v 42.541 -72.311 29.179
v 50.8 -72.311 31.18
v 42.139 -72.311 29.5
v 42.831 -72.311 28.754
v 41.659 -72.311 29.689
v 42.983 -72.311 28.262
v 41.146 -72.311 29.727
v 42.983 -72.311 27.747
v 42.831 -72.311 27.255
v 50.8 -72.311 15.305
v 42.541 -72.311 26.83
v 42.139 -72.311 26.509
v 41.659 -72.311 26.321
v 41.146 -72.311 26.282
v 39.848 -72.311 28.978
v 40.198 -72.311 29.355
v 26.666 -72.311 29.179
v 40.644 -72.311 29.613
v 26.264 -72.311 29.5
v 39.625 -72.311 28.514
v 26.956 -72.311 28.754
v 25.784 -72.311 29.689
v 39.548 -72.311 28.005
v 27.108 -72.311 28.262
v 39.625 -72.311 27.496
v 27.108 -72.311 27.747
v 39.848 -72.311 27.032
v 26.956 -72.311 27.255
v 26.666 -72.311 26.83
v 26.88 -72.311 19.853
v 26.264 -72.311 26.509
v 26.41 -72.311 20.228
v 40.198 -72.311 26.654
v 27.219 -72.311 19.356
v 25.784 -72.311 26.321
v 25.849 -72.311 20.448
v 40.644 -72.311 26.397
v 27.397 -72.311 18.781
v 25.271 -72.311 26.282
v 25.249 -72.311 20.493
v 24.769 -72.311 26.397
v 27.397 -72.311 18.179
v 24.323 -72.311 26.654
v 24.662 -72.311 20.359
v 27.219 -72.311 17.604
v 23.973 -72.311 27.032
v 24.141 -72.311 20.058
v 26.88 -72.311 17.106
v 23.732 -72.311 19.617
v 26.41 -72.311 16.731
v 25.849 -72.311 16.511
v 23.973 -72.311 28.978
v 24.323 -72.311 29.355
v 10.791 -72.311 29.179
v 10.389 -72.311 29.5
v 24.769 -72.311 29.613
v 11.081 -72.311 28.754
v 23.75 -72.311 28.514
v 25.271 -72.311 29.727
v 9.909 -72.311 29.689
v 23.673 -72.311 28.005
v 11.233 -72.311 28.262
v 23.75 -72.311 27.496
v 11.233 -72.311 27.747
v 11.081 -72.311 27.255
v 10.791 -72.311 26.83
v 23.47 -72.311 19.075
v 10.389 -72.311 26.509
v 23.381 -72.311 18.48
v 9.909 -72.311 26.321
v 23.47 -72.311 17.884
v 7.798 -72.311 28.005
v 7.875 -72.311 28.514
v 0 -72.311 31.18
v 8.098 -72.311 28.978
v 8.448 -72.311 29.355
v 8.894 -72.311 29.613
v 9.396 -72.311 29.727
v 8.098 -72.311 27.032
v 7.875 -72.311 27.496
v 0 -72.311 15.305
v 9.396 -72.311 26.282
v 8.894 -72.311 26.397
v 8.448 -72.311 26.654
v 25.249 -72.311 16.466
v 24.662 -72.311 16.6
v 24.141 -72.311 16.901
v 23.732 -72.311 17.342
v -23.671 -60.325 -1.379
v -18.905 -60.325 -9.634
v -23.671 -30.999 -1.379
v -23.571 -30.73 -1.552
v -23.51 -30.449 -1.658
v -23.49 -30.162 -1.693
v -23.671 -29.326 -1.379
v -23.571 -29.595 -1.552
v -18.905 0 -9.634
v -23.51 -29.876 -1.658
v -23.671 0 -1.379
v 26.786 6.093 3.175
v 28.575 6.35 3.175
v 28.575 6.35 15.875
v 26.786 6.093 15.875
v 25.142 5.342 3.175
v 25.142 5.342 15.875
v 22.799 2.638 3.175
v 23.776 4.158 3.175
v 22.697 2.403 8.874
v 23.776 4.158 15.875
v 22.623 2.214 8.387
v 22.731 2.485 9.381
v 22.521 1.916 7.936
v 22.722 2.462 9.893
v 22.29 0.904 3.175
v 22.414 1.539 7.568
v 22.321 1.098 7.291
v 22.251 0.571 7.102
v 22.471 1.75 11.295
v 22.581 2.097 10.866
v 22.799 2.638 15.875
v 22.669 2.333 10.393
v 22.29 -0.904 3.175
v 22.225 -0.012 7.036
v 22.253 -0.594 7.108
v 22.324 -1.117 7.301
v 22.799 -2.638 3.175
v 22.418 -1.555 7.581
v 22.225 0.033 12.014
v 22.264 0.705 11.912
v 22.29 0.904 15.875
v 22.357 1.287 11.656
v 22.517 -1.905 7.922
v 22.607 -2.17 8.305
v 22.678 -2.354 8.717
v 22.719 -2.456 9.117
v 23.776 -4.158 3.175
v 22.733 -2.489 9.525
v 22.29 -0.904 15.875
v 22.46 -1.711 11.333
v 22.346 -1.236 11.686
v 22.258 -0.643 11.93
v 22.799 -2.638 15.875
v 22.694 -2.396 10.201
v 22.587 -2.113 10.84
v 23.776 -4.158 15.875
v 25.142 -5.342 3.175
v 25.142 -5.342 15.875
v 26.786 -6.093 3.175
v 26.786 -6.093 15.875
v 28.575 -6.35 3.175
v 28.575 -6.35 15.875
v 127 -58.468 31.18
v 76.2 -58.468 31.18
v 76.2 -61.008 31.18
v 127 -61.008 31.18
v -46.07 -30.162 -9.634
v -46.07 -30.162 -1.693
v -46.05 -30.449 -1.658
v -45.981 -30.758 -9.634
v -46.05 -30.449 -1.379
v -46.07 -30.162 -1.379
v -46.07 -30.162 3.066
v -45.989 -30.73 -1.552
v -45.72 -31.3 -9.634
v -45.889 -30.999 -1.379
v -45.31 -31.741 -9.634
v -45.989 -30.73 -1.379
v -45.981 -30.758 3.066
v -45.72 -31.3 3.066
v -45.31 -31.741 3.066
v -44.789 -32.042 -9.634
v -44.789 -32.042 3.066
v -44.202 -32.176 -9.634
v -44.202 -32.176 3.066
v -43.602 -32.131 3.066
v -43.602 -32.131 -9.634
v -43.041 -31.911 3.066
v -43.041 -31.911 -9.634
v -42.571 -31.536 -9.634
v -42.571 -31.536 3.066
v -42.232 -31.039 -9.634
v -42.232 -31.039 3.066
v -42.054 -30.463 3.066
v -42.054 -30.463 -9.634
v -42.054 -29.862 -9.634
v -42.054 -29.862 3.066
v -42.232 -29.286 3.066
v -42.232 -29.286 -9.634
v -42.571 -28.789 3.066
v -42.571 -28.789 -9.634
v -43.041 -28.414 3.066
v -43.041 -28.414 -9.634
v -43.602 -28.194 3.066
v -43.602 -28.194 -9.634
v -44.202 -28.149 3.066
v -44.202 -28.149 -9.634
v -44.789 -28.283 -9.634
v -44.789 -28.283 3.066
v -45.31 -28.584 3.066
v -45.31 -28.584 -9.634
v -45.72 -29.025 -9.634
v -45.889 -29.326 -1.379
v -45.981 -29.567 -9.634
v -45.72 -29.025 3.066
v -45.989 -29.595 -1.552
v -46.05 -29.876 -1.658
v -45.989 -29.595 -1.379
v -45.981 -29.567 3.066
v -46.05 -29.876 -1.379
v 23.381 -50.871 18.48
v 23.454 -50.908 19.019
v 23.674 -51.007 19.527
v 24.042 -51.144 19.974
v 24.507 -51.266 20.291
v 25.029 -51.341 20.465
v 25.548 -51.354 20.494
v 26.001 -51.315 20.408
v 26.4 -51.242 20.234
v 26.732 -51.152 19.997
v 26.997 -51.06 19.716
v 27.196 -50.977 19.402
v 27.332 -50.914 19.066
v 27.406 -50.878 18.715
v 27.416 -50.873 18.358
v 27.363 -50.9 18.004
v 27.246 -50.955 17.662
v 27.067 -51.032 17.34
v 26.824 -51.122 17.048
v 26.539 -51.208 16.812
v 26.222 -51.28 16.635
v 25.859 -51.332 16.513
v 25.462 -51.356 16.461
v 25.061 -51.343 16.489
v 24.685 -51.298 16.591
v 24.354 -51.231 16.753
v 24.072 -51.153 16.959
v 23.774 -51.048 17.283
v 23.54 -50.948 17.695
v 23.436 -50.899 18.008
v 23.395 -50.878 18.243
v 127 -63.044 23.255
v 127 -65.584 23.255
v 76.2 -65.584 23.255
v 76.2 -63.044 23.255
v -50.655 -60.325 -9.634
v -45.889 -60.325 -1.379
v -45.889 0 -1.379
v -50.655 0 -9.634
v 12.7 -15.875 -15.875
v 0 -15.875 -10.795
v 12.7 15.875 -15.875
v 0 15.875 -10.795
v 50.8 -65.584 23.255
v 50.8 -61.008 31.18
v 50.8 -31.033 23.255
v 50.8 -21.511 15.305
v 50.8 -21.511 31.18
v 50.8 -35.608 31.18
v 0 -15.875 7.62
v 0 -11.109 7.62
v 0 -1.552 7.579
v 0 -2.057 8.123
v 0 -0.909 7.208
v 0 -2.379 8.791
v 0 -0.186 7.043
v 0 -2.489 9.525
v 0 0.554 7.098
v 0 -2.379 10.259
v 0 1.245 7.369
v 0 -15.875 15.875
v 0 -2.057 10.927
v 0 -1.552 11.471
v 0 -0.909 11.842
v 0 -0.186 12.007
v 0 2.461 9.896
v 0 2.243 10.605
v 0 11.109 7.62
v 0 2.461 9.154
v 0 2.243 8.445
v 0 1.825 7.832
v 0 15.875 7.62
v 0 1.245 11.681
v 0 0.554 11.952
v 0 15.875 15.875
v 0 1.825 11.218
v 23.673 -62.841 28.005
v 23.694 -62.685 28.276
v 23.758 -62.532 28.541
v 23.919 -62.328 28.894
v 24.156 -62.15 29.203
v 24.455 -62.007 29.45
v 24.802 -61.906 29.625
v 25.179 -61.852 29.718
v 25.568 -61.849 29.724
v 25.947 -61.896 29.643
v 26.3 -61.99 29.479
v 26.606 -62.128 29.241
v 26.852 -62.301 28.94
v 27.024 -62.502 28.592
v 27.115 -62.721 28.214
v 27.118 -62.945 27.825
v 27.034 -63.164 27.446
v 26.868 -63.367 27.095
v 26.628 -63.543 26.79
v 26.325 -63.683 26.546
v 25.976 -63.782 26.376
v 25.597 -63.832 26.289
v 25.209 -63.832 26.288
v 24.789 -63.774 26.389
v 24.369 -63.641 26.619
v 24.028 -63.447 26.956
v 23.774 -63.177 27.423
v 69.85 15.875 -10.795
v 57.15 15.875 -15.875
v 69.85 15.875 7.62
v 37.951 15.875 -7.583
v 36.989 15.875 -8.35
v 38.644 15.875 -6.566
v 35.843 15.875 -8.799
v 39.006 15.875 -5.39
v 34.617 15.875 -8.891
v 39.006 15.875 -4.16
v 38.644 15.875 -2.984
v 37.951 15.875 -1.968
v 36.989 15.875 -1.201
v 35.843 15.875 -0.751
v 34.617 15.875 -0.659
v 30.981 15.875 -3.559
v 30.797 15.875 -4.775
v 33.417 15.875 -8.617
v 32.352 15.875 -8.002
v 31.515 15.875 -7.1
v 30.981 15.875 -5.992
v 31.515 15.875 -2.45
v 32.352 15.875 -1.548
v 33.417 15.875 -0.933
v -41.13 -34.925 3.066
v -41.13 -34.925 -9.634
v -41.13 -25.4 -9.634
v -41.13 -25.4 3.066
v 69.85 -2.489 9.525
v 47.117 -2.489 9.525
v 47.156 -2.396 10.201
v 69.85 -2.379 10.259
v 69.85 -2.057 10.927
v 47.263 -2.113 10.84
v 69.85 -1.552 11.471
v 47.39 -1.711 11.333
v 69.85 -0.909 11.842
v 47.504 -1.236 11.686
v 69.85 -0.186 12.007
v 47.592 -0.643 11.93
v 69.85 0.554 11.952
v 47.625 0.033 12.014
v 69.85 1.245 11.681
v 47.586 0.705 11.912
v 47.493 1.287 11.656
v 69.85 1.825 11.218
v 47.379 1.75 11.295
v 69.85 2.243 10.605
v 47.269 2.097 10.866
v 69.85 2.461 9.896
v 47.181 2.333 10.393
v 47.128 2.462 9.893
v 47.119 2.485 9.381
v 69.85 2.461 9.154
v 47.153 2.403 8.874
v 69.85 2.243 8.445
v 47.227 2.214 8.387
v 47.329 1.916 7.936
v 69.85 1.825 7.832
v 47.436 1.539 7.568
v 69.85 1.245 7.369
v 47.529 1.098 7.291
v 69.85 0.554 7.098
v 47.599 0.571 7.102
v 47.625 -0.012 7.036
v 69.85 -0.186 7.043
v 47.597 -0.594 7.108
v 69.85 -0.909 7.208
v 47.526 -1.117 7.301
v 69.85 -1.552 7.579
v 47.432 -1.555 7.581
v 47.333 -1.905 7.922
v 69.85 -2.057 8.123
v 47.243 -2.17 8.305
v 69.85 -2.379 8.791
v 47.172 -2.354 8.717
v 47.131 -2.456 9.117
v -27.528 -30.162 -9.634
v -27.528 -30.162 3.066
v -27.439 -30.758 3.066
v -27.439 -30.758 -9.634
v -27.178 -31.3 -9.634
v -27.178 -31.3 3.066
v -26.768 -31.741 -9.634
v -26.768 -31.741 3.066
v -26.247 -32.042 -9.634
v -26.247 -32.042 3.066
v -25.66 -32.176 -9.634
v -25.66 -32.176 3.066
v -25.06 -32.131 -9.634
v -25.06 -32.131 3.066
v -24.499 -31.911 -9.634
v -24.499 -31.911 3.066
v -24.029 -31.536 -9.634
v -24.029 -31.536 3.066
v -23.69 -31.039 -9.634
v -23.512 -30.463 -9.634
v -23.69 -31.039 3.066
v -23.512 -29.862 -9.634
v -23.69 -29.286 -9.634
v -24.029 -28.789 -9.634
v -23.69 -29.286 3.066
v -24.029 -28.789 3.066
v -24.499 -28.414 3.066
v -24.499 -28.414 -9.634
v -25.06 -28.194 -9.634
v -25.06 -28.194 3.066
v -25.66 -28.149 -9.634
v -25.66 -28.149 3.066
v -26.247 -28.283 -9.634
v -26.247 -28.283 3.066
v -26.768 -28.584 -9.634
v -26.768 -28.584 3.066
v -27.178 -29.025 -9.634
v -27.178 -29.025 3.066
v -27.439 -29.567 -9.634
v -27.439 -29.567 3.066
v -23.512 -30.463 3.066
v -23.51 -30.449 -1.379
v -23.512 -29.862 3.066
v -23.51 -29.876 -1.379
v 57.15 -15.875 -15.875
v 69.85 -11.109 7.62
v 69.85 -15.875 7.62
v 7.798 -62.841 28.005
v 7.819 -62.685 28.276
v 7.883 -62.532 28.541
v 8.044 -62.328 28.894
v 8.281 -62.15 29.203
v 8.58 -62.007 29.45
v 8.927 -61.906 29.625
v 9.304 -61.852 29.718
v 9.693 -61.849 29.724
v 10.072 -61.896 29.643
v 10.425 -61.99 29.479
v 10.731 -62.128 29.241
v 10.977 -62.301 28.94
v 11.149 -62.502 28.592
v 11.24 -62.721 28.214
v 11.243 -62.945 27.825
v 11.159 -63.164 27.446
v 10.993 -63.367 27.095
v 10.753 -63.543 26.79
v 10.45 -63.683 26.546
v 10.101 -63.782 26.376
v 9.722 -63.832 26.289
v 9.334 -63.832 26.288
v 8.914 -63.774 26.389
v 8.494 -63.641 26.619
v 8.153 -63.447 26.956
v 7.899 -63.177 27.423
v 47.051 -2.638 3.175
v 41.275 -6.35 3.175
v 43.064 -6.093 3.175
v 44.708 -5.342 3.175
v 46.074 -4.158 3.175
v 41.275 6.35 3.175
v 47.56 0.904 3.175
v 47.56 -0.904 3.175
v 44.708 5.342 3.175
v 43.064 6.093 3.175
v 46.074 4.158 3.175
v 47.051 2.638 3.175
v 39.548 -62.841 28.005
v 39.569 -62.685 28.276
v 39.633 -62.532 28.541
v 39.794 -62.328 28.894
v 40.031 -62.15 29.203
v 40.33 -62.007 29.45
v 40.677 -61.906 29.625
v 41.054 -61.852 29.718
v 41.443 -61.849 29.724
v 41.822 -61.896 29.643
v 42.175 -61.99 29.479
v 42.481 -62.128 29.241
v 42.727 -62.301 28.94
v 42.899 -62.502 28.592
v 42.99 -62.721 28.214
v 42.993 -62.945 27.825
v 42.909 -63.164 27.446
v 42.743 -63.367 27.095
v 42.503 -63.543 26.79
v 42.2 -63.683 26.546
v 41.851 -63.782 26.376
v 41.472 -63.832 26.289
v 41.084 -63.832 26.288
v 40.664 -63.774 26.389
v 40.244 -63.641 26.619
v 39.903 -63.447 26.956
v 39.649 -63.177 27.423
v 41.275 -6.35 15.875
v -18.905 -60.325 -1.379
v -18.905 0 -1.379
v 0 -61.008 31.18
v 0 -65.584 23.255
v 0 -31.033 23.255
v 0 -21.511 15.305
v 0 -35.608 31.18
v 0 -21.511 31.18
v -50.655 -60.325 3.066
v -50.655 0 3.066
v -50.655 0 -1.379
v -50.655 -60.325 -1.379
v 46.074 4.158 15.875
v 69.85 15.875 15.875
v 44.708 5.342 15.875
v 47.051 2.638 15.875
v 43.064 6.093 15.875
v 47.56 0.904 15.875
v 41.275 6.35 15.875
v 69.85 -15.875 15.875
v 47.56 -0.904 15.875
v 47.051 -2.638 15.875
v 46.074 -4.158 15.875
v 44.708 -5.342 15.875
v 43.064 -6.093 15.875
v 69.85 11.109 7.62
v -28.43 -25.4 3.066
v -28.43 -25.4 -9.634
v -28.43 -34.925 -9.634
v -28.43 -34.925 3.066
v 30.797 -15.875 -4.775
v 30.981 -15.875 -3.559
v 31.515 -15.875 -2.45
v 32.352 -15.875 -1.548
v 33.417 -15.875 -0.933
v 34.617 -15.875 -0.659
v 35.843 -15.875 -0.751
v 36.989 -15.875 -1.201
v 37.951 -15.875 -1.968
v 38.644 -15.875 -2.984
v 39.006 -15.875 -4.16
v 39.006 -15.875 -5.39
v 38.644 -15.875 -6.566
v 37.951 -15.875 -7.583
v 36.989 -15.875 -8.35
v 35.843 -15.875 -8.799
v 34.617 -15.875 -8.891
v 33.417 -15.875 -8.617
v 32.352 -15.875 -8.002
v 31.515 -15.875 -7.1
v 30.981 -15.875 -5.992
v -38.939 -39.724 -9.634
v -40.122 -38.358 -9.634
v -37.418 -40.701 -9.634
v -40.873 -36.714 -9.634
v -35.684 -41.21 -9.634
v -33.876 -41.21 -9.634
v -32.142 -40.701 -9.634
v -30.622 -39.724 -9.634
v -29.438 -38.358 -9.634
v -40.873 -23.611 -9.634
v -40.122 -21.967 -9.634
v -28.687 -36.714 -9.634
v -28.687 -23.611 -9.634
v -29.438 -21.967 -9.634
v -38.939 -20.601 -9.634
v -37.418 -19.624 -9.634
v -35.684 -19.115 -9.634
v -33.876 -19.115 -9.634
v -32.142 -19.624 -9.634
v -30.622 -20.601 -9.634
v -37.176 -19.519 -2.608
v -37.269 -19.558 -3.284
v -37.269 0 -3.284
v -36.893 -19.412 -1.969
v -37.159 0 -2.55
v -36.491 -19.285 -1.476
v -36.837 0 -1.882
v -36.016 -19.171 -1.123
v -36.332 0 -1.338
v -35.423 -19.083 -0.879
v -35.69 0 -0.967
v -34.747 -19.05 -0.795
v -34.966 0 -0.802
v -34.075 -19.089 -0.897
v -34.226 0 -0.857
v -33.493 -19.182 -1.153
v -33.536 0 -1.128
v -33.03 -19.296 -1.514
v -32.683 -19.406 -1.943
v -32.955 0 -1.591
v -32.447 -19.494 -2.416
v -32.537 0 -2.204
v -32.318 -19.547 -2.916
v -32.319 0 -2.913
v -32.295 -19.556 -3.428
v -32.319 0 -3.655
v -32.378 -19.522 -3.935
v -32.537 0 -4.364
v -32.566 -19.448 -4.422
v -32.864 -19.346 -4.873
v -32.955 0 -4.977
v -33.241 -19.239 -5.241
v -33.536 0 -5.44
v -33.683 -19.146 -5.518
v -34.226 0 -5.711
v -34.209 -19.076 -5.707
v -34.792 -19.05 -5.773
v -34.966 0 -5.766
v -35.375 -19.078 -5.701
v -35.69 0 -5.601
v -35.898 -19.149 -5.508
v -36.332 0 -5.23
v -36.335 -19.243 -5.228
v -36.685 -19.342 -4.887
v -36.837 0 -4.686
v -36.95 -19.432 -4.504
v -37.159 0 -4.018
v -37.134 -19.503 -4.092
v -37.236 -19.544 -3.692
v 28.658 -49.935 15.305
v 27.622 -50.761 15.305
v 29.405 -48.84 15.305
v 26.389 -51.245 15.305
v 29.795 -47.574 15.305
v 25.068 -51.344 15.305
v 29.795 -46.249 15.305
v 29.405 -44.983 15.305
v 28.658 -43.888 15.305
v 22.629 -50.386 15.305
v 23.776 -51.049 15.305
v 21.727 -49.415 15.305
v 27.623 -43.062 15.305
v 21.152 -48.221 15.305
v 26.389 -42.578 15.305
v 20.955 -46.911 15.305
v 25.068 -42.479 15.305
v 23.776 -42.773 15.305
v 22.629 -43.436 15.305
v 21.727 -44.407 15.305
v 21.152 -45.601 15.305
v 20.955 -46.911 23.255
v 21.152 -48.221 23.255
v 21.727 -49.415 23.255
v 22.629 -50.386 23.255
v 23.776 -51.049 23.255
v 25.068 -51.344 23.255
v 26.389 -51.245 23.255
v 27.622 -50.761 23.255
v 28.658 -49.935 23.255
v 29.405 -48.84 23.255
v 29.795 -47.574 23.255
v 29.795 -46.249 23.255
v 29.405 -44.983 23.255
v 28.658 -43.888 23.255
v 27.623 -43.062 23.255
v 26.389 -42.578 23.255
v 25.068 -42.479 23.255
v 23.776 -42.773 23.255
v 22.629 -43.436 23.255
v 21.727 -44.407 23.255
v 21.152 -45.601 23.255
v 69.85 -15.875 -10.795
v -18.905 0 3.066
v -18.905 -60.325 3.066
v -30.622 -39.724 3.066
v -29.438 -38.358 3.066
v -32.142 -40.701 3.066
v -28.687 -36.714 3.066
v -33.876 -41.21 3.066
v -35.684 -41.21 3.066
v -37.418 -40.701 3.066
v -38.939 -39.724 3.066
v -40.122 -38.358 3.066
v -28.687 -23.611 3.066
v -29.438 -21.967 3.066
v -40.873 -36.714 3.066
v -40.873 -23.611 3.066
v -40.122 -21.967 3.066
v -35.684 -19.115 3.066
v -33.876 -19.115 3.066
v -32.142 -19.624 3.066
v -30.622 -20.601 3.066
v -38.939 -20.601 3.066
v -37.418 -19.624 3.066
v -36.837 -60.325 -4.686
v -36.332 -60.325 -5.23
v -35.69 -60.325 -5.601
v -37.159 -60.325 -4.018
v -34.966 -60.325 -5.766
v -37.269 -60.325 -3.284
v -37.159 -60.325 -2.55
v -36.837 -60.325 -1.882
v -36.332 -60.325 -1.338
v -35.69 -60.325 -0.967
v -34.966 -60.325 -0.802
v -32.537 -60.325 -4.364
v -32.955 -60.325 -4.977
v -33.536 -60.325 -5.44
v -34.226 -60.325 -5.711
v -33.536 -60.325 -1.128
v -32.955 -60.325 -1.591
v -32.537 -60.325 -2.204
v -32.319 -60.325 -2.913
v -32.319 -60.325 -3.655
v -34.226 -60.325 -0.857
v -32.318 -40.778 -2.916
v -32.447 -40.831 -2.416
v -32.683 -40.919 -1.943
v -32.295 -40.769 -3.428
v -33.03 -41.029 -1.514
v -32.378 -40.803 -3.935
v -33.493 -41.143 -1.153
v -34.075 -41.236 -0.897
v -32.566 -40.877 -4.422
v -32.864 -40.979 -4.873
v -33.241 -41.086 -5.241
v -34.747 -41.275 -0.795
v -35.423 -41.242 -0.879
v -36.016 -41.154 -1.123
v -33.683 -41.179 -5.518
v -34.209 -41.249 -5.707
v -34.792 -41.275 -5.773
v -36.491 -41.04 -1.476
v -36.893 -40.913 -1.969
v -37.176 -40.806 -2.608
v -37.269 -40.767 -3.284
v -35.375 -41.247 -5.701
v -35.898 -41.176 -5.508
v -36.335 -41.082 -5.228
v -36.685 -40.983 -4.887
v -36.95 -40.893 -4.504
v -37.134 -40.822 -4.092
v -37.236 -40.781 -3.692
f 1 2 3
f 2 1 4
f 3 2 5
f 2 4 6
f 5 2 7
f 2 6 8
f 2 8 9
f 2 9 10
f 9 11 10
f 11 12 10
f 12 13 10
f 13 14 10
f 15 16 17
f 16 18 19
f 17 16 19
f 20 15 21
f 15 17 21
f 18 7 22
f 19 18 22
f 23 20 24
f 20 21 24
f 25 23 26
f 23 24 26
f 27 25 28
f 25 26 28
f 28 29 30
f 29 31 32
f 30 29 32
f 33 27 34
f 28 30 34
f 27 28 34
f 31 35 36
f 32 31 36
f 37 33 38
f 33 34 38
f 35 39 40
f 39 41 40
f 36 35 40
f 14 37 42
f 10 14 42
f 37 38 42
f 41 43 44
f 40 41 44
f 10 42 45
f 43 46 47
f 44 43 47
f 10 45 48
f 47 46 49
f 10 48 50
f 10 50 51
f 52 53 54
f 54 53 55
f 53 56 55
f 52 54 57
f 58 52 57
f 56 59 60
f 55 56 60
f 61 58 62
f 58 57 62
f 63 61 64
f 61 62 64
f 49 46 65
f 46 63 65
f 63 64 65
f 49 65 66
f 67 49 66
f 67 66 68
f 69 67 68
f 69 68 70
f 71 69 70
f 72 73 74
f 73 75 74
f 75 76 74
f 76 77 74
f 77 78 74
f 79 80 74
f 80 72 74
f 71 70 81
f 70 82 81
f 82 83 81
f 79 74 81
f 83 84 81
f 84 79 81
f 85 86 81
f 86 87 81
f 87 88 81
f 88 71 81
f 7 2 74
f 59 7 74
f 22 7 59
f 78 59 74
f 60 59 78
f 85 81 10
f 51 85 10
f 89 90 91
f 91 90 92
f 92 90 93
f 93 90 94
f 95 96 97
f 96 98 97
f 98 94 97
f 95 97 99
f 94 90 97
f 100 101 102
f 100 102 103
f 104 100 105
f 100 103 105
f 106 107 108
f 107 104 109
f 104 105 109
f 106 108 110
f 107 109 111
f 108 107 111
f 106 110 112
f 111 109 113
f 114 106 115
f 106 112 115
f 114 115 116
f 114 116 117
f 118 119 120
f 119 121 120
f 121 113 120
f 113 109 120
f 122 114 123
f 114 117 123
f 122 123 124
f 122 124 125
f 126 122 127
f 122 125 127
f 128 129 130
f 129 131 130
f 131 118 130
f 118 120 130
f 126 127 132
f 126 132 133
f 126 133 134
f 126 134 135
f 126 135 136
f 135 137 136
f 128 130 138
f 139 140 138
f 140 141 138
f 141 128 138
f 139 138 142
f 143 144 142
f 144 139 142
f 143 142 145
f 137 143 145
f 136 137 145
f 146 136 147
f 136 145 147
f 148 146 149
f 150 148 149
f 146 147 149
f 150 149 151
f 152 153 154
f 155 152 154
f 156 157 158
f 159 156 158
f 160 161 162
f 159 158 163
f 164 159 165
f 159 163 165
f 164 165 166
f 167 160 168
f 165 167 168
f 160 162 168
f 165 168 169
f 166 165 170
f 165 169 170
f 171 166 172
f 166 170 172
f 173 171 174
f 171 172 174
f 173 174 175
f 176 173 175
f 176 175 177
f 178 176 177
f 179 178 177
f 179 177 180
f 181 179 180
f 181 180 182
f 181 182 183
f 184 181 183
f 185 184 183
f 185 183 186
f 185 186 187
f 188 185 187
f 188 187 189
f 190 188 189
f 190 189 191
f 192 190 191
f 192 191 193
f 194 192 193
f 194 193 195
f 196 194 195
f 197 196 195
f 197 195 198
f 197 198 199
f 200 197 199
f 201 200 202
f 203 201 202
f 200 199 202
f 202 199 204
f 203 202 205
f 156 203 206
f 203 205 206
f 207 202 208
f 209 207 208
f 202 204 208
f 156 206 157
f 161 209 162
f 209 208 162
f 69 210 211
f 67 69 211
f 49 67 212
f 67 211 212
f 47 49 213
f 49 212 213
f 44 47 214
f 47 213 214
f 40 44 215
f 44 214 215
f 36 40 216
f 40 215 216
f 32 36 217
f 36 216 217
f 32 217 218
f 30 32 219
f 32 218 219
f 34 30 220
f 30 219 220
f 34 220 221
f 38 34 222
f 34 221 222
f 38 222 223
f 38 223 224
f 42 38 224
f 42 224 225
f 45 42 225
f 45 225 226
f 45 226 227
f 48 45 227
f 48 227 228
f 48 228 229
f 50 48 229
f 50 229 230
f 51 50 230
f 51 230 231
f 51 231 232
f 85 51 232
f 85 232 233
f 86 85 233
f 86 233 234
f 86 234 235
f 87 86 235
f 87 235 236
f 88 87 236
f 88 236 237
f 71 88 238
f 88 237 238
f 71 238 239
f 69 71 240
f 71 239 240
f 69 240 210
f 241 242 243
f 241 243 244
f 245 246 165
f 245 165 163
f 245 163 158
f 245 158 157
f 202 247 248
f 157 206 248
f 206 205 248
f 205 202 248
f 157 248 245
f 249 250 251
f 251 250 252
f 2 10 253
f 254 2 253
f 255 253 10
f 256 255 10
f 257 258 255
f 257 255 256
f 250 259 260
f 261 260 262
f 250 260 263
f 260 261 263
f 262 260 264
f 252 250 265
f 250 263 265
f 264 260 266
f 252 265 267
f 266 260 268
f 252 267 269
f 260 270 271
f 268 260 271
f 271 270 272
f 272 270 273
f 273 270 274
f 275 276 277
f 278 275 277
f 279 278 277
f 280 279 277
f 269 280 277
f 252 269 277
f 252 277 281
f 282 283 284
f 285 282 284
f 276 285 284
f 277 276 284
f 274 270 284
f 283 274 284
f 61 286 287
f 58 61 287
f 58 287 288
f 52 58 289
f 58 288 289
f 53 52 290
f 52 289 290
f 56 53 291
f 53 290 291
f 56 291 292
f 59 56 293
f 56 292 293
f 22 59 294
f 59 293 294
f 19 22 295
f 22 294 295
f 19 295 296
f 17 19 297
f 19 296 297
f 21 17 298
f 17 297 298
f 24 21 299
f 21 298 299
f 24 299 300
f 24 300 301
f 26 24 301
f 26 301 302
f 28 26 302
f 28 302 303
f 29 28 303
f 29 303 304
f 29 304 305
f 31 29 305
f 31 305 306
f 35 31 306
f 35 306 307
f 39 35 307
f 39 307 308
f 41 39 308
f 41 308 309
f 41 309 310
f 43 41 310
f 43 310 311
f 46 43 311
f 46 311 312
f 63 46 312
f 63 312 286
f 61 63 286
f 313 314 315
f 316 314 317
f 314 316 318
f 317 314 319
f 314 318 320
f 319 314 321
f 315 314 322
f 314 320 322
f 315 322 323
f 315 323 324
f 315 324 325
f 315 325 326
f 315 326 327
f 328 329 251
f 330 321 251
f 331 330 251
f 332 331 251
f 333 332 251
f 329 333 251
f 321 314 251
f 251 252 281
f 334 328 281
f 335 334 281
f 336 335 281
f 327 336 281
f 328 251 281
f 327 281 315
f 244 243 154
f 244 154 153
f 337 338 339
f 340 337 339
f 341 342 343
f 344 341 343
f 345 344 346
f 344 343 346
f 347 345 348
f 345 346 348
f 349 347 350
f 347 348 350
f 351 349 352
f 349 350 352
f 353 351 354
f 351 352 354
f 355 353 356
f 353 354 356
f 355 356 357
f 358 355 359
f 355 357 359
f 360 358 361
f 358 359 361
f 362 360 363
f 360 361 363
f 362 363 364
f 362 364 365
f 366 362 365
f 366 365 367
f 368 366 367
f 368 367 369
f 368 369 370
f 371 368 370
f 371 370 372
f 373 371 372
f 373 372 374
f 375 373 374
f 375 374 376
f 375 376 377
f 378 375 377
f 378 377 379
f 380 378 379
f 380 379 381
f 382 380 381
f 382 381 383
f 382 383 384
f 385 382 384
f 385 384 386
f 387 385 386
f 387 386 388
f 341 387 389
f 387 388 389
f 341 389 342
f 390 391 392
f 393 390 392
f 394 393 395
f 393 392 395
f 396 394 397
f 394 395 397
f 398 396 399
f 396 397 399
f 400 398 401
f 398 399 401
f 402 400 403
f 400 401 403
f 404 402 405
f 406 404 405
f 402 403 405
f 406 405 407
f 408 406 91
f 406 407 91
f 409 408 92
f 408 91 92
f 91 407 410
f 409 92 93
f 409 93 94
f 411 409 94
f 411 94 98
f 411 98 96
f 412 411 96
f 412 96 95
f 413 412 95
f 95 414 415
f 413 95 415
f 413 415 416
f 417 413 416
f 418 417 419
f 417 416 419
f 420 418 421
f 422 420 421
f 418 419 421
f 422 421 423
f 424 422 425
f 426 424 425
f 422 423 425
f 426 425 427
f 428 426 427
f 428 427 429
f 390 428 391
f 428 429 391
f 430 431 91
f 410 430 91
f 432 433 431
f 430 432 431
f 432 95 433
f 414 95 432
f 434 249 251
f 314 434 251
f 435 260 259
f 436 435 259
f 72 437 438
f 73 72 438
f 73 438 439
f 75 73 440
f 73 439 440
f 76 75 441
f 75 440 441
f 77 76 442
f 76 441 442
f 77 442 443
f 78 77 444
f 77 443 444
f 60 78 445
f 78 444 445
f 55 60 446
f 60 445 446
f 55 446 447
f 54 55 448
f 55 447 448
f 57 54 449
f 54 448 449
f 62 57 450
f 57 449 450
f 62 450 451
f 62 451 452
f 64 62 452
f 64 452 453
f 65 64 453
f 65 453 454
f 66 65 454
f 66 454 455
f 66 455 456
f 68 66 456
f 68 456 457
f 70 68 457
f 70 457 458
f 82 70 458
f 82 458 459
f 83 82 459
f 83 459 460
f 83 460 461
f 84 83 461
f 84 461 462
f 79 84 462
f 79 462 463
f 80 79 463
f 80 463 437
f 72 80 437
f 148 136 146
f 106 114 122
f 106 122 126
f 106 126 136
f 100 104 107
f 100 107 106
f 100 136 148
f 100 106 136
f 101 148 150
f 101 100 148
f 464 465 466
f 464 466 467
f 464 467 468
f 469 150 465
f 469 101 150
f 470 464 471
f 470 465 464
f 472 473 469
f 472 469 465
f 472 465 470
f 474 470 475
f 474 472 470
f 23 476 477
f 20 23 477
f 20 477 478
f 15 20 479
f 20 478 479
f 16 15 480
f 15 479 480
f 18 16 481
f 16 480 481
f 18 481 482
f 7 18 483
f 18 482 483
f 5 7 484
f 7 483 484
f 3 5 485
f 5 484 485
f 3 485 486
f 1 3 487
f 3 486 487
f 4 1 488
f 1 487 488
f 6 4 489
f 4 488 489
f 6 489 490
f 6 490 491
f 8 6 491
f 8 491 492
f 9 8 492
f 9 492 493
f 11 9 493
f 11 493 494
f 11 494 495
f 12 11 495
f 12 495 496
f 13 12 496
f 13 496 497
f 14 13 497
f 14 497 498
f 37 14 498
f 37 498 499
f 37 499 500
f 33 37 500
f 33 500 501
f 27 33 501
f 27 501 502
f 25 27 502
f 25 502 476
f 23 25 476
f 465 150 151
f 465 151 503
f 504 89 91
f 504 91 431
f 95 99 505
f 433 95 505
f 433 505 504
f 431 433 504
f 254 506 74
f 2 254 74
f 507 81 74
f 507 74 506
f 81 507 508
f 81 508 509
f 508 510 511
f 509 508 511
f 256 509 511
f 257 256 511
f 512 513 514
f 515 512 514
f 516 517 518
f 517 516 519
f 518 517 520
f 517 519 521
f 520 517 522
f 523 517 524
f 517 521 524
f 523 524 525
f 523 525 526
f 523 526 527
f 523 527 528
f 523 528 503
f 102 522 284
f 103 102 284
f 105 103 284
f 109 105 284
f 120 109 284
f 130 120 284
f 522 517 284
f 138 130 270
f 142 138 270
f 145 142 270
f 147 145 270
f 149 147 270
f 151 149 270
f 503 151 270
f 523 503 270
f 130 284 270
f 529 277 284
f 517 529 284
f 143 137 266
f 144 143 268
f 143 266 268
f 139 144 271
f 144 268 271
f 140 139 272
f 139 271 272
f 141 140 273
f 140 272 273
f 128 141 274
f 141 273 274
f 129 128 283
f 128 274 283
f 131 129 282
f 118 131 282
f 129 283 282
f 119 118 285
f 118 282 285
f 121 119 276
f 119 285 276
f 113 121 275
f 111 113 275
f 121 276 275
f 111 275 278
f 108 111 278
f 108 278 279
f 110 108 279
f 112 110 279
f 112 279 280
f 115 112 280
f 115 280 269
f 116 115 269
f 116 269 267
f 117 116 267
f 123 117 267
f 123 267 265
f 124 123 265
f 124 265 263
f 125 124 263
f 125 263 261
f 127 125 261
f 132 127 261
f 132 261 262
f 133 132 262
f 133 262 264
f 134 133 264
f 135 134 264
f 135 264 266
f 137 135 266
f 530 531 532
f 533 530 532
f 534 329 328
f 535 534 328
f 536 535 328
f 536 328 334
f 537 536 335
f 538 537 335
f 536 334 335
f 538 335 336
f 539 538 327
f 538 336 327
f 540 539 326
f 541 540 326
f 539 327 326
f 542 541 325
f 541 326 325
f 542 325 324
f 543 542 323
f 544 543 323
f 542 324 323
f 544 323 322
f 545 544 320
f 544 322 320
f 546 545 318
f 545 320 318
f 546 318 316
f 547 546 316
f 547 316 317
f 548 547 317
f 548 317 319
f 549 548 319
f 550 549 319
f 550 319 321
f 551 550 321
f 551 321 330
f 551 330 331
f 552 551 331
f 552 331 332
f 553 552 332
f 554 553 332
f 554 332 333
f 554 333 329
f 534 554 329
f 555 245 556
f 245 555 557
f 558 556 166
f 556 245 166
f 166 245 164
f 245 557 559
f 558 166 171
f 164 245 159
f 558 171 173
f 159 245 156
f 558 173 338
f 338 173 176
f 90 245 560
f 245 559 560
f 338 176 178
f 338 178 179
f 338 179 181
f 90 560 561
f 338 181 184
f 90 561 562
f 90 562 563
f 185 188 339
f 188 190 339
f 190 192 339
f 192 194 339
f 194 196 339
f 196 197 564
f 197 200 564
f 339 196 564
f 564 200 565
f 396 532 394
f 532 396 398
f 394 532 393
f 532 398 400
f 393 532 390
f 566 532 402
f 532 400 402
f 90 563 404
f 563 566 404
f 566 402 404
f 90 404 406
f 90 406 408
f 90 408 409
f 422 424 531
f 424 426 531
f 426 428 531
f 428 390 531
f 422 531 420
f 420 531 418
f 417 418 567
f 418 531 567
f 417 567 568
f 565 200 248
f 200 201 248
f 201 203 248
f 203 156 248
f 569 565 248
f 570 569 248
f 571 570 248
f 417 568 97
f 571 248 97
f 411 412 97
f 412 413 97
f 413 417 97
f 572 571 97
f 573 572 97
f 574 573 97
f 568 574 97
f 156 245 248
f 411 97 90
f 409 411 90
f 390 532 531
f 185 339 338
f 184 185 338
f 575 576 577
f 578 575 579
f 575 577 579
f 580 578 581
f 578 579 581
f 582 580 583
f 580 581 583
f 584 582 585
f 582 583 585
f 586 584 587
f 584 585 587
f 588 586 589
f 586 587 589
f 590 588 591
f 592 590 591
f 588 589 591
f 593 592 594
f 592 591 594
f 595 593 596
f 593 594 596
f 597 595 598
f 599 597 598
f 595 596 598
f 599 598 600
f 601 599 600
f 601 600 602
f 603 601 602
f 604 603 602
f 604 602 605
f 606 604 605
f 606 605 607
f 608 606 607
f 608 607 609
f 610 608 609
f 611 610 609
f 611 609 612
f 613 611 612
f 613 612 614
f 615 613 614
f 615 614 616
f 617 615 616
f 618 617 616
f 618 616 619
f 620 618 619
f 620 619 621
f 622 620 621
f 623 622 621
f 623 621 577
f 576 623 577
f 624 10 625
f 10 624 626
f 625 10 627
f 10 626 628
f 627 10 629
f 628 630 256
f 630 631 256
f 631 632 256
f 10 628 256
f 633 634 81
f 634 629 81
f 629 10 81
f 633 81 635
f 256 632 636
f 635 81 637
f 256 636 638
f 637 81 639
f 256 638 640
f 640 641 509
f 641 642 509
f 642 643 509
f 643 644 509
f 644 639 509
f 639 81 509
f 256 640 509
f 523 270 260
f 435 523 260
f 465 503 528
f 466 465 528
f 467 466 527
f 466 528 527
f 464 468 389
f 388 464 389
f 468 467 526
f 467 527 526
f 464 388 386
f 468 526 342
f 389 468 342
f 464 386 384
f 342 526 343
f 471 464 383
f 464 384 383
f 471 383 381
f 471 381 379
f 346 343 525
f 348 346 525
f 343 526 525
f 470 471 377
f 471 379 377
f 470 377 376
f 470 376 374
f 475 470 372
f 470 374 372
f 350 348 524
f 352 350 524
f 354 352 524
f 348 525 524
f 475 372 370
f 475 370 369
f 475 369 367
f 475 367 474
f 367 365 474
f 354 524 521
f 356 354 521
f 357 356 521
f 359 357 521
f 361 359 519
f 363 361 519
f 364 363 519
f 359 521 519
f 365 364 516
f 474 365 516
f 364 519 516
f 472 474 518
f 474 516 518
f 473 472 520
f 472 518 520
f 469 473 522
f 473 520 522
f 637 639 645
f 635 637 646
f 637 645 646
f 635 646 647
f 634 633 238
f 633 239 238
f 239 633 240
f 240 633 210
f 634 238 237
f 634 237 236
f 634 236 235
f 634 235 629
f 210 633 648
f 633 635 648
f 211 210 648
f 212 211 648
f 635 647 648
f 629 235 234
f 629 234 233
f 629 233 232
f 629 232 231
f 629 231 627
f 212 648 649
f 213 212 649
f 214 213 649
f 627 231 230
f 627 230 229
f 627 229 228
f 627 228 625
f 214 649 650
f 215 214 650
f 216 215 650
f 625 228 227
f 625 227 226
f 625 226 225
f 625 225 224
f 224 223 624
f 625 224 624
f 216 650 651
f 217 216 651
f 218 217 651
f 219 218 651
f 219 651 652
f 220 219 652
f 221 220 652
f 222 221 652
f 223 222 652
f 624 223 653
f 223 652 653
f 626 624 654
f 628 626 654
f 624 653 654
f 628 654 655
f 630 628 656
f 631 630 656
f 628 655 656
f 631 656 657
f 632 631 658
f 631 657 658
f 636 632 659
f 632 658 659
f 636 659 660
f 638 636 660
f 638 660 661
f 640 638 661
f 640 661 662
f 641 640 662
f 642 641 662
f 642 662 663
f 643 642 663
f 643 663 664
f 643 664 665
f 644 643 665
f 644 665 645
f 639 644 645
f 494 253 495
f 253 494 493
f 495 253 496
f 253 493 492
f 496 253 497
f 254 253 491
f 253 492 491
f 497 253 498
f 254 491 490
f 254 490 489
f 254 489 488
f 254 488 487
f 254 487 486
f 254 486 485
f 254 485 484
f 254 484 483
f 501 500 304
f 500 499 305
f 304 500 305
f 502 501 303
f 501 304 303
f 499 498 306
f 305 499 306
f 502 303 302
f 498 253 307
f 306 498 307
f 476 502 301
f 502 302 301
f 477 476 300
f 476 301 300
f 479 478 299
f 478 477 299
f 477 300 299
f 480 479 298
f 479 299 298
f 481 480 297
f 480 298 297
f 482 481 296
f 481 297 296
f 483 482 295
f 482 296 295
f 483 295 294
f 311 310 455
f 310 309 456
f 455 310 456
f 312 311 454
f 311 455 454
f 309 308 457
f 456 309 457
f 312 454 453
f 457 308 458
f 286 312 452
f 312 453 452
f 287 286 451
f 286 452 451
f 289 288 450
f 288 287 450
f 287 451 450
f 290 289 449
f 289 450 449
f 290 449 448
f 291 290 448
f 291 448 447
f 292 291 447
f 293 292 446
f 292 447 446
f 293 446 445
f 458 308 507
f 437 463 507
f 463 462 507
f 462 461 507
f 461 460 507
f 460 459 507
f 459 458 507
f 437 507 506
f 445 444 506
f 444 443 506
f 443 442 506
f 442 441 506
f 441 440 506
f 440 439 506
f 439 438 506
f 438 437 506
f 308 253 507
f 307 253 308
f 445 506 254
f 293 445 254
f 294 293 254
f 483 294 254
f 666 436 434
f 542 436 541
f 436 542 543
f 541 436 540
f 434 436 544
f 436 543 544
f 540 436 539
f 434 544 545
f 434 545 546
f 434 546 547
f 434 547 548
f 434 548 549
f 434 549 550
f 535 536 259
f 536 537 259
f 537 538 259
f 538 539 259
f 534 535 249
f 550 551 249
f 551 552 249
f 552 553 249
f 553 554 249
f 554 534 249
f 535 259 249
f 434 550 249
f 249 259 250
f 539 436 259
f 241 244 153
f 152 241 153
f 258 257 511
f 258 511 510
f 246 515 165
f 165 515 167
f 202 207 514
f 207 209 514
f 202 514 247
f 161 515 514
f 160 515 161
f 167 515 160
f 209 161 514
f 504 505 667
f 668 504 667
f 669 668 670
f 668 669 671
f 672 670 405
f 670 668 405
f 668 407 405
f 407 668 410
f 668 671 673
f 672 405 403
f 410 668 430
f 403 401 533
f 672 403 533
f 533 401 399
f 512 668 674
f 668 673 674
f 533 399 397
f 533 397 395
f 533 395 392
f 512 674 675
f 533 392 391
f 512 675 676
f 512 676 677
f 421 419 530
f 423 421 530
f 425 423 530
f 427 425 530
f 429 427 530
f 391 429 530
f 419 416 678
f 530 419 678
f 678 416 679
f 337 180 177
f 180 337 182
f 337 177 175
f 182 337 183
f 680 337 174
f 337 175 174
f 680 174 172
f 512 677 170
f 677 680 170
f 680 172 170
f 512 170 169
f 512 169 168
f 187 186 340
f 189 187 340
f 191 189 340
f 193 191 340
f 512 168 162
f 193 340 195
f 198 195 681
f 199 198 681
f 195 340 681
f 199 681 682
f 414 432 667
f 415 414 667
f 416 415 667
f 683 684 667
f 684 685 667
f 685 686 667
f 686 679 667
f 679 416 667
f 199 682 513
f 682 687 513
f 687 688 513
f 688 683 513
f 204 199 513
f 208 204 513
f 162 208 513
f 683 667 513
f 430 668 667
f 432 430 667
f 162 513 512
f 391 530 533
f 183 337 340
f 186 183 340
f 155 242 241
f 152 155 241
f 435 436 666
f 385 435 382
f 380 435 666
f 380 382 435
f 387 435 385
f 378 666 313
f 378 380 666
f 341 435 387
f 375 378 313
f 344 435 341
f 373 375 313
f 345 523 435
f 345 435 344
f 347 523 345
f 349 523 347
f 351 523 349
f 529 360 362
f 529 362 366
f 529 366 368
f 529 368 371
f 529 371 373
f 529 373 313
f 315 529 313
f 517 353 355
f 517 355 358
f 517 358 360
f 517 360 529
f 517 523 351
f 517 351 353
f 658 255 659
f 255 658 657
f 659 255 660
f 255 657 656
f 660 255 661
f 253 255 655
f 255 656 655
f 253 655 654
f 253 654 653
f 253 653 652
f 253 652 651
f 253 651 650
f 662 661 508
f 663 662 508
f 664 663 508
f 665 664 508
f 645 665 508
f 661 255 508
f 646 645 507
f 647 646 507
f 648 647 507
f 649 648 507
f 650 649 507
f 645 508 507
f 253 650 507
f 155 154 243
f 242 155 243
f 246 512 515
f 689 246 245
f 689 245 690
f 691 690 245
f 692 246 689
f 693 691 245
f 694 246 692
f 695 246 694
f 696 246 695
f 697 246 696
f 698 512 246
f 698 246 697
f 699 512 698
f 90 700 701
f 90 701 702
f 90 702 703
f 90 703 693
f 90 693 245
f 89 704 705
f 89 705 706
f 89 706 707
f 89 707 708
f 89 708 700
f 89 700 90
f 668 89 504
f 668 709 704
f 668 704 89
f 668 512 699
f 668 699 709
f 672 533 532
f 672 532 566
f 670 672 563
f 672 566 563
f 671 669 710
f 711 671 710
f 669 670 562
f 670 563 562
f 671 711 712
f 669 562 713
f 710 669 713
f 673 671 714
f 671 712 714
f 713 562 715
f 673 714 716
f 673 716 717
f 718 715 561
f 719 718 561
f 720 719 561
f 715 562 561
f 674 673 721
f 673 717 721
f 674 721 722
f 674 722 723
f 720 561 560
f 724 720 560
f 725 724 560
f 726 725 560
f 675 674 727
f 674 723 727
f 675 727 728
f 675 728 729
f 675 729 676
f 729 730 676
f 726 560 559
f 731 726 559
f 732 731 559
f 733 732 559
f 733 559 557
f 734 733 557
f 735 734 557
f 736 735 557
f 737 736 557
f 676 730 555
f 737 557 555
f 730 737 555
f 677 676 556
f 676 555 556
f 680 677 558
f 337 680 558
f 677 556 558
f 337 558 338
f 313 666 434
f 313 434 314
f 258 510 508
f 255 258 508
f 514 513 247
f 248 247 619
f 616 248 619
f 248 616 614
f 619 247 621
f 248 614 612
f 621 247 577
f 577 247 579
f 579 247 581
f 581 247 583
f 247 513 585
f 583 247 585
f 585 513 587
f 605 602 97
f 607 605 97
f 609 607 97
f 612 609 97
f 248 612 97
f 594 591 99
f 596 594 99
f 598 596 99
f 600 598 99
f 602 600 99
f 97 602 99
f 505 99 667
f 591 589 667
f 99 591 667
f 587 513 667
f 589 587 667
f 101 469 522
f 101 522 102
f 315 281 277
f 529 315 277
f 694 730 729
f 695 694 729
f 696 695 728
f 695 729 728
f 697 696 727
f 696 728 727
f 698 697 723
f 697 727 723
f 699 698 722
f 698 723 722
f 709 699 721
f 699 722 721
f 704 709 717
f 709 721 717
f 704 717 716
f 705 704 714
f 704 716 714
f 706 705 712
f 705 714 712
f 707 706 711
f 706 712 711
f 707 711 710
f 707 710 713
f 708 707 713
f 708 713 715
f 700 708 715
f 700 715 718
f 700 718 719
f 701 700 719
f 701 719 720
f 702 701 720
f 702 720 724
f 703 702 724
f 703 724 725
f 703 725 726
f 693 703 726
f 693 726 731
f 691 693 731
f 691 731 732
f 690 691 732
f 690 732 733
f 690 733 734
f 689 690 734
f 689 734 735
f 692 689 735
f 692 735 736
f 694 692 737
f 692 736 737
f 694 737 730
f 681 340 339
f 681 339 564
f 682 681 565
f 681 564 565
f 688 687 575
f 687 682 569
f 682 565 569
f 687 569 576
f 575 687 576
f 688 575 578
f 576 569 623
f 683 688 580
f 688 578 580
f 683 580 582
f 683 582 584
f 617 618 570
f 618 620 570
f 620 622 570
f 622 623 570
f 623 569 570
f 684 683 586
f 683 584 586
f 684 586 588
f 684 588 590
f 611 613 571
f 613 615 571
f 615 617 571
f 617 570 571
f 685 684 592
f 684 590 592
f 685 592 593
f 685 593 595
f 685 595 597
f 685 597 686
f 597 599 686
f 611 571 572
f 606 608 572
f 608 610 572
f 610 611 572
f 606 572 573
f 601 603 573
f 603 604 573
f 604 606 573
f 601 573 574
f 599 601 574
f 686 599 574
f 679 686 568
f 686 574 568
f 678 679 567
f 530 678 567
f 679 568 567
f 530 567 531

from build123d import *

# Parameters (mm, degrees)
F1_DEPTH  = 69.85
F3_D      = 4.9784
F5_D      = 8.255
F7_DEPTH  = 12.7
F9_DEPTH  = 60.325
F11_D     = 4.9784
F13_DEPTH = 25.5099957942
F15_D     = 4.0386
F17_DEPTH = 50.8
F19_D     = 8.89
F21_D     = 4.0386
F21_DEPTH = 25.4
F21_TIP   = 1.213317848
F22_D     = 3.4544
F22_DEPTH = 19.05
F22_TIP   = 1.0378064612
F25_DEPTH = 50.8
F26_SIZE2 = 5.08
F26_SIZE  = 12.7


with BuildPart() as f1:
    # F0 (on Right) → F1 (new body)
    with BuildSketch(Plane.YZ):
        Polygon((-15.875, -15.875), (15.875, -15.875), (15.875, 7.62), (11.1089735278, 7.62), (15.875, 15.875), (-15.875, 15.875), (-11.1089735278, 7.62), (-15.875, 7.62), align=None)
    extrude(amount=F1_DEPTH)

    # F3 (through all)
    with Locations(Plane.YZ.offset(69.85)):
        with Locations((0, 9.525)):
            Hole(F3_D / 2)

    # F5 (through all)
    with Locations(Plane.XZ.offset(15.875)):
        with Locations((34.925, -4.7752)):
            Hole(F5_D / 2)

    # F6 (on face) → F7 (cut)
    with BuildSketch(Plane.XY.offset(15.875)):
        with BuildLine():
            ThreePointArc((28.575, 6.35), (22.225, 0), (28.575, -6.35))
            Line((28.575, -6.35), (41.275, -6.35))
            ThreePointArc((41.275, -6.35), (47.625, 0), (41.275, 6.35))
            Line((41.275, 6.35), (28.575, 6.35))
        make_face()
    extrude(amount=-F7_DEPTH, mode=Mode.SUBTRACT)

    # F26
    f26_edges = [f1.edges().sort_by_distance(p)[0] for p in [
        (69.85, 0, -15.875),
        (0, 0, -15.875),
    ]]
    f26_side = f1.faces().sort_by_distance((34.925, 0, -15.875))[0]
    chamfer(f26_edges, length=F26_SIZE, length2=F26_SIZE2, reference=f26_side)


with BuildPart() as f9:
    # F8 (on Front) → F9 (new body)
    with BuildSketch(Plane.XZ):
        Polygon((-18.9051372717, 3.0660043058), (-50.6551372717, 3.0660043058), (-50.6551372717, -1.3789956942), (-45.8891107996, -1.3789956942), (-50.6551372717, -9.6339956942), (-18.9051372717, -9.6339956942), (-23.6711637439, -1.3789956942), (-18.9051372717, -1.3789956942), align=None)
    extrude(amount=F9_DEPTH)

    # F11 (through all)
    with Locations(Plane.XZ.offset(60.325)):
        with Locations((-34.7801372717, -3.2839956942)):
            Hole(F11_D / 2)

    # F12 (on face) → F13 (cut, through all)
    with BuildSketch(Plane(origin=(0, 0, -9.6339956942), x_dir=(1, 0, 0), z_dir=(0, 0, -1))):
        with BuildLine():
            ThreePointArc((-28.4301372717, 34.925), (-34.7801372717, 41.275), (-41.1301372717, 34.925))
            Line((-41.1301372717, 34.925), (-41.1301372717, 25.4))
            ThreePointArc((-41.1301372717, 25.4), (-34.7801372717, 19.05), (-28.4301372717, 25.4))
            Line((-28.4301372717, 25.4), (-28.4301372717, 34.925))
        make_face()
    extrude(amount=-F13_DEPTH, mode=Mode.SUBTRACT)

    # F15 (through all)
    with Locations(Plane(origin=(0, 0, -9.6339956942), x_dir=(1, 0, 0), z_dir=(0, 0, -1))):
        with Locations((-25.5091372717, 30.1625), (-44.0511372717, 30.1625)):
            Hole(F15_D / 2)


with BuildPart() as f17:
    # F16 (on Right) → F17 (new body)
    with BuildSketch(Plane.YZ):
        Polygon((-61.008209191, 31.1796985877), (-72.311209191, 31.1796985877), (-72.311209191, 15.3046985877), (-21.511209191, 15.3046985877), (-21.511209191, 31.1796985877), (-35.608209191, 31.1796985877), (-31.0328237777, 23.2548985877), (-65.5835946043, 23.2548985877), align=None)
    extrude(amount=F17_DEPTH)

    # F19 (through all)
    with Locations(Plane(origin=(0, 0, 15.3046985877), x_dir=(1, 0, 0), z_dir=(0, 0, -1))):
        with Locations((25.4, 46.911209191)):
            Hole(F19_D / 2)

    # F21
    with Locations(Plane.XZ.offset(72.311209191)):
        with Locations((25.4, 18.4796985877)):
            Hole(F21_D / 2, depth=F21_DEPTH)
            with Locations((0, 0, -(F21_DEPTH + F21_TIP / 2))):  # 118° drill point
                Cone(0, F21_D / 2, F21_TIP, mode=Mode.SUBTRACT)

    # F22
    with Locations(Plane.XZ.offset(72.311209191)):
        with Locations((9.525, 28.0046985877), (25.4, 28.0046985877), (41.275, 28.0046985877)):
            Hole(F22_D / 2, depth=F22_DEPTH)
            with Locations((0, 0, -(F22_DEPTH + F22_TIP / 2))):  # 118° drill point
                Cone(0, F22_D / 2, F22_TIP, mode=Mode.SUBTRACT)


with BuildPart() as f25:
    # F24 (on offset) → F25 (new body)
    with BuildSketch(Plane.YZ.offset(76.2)):
        Polygon((-58.468209191, 31.1796985877), (-61.008209191, 31.1796985877), (-65.5835946043, 23.2548985877), (-63.0435946043, 23.2548985877), align=None)
    extrude(amount=F25_DEPTH)


solid = Compound([f1.part, f9.part, f17.part, f25.part])
